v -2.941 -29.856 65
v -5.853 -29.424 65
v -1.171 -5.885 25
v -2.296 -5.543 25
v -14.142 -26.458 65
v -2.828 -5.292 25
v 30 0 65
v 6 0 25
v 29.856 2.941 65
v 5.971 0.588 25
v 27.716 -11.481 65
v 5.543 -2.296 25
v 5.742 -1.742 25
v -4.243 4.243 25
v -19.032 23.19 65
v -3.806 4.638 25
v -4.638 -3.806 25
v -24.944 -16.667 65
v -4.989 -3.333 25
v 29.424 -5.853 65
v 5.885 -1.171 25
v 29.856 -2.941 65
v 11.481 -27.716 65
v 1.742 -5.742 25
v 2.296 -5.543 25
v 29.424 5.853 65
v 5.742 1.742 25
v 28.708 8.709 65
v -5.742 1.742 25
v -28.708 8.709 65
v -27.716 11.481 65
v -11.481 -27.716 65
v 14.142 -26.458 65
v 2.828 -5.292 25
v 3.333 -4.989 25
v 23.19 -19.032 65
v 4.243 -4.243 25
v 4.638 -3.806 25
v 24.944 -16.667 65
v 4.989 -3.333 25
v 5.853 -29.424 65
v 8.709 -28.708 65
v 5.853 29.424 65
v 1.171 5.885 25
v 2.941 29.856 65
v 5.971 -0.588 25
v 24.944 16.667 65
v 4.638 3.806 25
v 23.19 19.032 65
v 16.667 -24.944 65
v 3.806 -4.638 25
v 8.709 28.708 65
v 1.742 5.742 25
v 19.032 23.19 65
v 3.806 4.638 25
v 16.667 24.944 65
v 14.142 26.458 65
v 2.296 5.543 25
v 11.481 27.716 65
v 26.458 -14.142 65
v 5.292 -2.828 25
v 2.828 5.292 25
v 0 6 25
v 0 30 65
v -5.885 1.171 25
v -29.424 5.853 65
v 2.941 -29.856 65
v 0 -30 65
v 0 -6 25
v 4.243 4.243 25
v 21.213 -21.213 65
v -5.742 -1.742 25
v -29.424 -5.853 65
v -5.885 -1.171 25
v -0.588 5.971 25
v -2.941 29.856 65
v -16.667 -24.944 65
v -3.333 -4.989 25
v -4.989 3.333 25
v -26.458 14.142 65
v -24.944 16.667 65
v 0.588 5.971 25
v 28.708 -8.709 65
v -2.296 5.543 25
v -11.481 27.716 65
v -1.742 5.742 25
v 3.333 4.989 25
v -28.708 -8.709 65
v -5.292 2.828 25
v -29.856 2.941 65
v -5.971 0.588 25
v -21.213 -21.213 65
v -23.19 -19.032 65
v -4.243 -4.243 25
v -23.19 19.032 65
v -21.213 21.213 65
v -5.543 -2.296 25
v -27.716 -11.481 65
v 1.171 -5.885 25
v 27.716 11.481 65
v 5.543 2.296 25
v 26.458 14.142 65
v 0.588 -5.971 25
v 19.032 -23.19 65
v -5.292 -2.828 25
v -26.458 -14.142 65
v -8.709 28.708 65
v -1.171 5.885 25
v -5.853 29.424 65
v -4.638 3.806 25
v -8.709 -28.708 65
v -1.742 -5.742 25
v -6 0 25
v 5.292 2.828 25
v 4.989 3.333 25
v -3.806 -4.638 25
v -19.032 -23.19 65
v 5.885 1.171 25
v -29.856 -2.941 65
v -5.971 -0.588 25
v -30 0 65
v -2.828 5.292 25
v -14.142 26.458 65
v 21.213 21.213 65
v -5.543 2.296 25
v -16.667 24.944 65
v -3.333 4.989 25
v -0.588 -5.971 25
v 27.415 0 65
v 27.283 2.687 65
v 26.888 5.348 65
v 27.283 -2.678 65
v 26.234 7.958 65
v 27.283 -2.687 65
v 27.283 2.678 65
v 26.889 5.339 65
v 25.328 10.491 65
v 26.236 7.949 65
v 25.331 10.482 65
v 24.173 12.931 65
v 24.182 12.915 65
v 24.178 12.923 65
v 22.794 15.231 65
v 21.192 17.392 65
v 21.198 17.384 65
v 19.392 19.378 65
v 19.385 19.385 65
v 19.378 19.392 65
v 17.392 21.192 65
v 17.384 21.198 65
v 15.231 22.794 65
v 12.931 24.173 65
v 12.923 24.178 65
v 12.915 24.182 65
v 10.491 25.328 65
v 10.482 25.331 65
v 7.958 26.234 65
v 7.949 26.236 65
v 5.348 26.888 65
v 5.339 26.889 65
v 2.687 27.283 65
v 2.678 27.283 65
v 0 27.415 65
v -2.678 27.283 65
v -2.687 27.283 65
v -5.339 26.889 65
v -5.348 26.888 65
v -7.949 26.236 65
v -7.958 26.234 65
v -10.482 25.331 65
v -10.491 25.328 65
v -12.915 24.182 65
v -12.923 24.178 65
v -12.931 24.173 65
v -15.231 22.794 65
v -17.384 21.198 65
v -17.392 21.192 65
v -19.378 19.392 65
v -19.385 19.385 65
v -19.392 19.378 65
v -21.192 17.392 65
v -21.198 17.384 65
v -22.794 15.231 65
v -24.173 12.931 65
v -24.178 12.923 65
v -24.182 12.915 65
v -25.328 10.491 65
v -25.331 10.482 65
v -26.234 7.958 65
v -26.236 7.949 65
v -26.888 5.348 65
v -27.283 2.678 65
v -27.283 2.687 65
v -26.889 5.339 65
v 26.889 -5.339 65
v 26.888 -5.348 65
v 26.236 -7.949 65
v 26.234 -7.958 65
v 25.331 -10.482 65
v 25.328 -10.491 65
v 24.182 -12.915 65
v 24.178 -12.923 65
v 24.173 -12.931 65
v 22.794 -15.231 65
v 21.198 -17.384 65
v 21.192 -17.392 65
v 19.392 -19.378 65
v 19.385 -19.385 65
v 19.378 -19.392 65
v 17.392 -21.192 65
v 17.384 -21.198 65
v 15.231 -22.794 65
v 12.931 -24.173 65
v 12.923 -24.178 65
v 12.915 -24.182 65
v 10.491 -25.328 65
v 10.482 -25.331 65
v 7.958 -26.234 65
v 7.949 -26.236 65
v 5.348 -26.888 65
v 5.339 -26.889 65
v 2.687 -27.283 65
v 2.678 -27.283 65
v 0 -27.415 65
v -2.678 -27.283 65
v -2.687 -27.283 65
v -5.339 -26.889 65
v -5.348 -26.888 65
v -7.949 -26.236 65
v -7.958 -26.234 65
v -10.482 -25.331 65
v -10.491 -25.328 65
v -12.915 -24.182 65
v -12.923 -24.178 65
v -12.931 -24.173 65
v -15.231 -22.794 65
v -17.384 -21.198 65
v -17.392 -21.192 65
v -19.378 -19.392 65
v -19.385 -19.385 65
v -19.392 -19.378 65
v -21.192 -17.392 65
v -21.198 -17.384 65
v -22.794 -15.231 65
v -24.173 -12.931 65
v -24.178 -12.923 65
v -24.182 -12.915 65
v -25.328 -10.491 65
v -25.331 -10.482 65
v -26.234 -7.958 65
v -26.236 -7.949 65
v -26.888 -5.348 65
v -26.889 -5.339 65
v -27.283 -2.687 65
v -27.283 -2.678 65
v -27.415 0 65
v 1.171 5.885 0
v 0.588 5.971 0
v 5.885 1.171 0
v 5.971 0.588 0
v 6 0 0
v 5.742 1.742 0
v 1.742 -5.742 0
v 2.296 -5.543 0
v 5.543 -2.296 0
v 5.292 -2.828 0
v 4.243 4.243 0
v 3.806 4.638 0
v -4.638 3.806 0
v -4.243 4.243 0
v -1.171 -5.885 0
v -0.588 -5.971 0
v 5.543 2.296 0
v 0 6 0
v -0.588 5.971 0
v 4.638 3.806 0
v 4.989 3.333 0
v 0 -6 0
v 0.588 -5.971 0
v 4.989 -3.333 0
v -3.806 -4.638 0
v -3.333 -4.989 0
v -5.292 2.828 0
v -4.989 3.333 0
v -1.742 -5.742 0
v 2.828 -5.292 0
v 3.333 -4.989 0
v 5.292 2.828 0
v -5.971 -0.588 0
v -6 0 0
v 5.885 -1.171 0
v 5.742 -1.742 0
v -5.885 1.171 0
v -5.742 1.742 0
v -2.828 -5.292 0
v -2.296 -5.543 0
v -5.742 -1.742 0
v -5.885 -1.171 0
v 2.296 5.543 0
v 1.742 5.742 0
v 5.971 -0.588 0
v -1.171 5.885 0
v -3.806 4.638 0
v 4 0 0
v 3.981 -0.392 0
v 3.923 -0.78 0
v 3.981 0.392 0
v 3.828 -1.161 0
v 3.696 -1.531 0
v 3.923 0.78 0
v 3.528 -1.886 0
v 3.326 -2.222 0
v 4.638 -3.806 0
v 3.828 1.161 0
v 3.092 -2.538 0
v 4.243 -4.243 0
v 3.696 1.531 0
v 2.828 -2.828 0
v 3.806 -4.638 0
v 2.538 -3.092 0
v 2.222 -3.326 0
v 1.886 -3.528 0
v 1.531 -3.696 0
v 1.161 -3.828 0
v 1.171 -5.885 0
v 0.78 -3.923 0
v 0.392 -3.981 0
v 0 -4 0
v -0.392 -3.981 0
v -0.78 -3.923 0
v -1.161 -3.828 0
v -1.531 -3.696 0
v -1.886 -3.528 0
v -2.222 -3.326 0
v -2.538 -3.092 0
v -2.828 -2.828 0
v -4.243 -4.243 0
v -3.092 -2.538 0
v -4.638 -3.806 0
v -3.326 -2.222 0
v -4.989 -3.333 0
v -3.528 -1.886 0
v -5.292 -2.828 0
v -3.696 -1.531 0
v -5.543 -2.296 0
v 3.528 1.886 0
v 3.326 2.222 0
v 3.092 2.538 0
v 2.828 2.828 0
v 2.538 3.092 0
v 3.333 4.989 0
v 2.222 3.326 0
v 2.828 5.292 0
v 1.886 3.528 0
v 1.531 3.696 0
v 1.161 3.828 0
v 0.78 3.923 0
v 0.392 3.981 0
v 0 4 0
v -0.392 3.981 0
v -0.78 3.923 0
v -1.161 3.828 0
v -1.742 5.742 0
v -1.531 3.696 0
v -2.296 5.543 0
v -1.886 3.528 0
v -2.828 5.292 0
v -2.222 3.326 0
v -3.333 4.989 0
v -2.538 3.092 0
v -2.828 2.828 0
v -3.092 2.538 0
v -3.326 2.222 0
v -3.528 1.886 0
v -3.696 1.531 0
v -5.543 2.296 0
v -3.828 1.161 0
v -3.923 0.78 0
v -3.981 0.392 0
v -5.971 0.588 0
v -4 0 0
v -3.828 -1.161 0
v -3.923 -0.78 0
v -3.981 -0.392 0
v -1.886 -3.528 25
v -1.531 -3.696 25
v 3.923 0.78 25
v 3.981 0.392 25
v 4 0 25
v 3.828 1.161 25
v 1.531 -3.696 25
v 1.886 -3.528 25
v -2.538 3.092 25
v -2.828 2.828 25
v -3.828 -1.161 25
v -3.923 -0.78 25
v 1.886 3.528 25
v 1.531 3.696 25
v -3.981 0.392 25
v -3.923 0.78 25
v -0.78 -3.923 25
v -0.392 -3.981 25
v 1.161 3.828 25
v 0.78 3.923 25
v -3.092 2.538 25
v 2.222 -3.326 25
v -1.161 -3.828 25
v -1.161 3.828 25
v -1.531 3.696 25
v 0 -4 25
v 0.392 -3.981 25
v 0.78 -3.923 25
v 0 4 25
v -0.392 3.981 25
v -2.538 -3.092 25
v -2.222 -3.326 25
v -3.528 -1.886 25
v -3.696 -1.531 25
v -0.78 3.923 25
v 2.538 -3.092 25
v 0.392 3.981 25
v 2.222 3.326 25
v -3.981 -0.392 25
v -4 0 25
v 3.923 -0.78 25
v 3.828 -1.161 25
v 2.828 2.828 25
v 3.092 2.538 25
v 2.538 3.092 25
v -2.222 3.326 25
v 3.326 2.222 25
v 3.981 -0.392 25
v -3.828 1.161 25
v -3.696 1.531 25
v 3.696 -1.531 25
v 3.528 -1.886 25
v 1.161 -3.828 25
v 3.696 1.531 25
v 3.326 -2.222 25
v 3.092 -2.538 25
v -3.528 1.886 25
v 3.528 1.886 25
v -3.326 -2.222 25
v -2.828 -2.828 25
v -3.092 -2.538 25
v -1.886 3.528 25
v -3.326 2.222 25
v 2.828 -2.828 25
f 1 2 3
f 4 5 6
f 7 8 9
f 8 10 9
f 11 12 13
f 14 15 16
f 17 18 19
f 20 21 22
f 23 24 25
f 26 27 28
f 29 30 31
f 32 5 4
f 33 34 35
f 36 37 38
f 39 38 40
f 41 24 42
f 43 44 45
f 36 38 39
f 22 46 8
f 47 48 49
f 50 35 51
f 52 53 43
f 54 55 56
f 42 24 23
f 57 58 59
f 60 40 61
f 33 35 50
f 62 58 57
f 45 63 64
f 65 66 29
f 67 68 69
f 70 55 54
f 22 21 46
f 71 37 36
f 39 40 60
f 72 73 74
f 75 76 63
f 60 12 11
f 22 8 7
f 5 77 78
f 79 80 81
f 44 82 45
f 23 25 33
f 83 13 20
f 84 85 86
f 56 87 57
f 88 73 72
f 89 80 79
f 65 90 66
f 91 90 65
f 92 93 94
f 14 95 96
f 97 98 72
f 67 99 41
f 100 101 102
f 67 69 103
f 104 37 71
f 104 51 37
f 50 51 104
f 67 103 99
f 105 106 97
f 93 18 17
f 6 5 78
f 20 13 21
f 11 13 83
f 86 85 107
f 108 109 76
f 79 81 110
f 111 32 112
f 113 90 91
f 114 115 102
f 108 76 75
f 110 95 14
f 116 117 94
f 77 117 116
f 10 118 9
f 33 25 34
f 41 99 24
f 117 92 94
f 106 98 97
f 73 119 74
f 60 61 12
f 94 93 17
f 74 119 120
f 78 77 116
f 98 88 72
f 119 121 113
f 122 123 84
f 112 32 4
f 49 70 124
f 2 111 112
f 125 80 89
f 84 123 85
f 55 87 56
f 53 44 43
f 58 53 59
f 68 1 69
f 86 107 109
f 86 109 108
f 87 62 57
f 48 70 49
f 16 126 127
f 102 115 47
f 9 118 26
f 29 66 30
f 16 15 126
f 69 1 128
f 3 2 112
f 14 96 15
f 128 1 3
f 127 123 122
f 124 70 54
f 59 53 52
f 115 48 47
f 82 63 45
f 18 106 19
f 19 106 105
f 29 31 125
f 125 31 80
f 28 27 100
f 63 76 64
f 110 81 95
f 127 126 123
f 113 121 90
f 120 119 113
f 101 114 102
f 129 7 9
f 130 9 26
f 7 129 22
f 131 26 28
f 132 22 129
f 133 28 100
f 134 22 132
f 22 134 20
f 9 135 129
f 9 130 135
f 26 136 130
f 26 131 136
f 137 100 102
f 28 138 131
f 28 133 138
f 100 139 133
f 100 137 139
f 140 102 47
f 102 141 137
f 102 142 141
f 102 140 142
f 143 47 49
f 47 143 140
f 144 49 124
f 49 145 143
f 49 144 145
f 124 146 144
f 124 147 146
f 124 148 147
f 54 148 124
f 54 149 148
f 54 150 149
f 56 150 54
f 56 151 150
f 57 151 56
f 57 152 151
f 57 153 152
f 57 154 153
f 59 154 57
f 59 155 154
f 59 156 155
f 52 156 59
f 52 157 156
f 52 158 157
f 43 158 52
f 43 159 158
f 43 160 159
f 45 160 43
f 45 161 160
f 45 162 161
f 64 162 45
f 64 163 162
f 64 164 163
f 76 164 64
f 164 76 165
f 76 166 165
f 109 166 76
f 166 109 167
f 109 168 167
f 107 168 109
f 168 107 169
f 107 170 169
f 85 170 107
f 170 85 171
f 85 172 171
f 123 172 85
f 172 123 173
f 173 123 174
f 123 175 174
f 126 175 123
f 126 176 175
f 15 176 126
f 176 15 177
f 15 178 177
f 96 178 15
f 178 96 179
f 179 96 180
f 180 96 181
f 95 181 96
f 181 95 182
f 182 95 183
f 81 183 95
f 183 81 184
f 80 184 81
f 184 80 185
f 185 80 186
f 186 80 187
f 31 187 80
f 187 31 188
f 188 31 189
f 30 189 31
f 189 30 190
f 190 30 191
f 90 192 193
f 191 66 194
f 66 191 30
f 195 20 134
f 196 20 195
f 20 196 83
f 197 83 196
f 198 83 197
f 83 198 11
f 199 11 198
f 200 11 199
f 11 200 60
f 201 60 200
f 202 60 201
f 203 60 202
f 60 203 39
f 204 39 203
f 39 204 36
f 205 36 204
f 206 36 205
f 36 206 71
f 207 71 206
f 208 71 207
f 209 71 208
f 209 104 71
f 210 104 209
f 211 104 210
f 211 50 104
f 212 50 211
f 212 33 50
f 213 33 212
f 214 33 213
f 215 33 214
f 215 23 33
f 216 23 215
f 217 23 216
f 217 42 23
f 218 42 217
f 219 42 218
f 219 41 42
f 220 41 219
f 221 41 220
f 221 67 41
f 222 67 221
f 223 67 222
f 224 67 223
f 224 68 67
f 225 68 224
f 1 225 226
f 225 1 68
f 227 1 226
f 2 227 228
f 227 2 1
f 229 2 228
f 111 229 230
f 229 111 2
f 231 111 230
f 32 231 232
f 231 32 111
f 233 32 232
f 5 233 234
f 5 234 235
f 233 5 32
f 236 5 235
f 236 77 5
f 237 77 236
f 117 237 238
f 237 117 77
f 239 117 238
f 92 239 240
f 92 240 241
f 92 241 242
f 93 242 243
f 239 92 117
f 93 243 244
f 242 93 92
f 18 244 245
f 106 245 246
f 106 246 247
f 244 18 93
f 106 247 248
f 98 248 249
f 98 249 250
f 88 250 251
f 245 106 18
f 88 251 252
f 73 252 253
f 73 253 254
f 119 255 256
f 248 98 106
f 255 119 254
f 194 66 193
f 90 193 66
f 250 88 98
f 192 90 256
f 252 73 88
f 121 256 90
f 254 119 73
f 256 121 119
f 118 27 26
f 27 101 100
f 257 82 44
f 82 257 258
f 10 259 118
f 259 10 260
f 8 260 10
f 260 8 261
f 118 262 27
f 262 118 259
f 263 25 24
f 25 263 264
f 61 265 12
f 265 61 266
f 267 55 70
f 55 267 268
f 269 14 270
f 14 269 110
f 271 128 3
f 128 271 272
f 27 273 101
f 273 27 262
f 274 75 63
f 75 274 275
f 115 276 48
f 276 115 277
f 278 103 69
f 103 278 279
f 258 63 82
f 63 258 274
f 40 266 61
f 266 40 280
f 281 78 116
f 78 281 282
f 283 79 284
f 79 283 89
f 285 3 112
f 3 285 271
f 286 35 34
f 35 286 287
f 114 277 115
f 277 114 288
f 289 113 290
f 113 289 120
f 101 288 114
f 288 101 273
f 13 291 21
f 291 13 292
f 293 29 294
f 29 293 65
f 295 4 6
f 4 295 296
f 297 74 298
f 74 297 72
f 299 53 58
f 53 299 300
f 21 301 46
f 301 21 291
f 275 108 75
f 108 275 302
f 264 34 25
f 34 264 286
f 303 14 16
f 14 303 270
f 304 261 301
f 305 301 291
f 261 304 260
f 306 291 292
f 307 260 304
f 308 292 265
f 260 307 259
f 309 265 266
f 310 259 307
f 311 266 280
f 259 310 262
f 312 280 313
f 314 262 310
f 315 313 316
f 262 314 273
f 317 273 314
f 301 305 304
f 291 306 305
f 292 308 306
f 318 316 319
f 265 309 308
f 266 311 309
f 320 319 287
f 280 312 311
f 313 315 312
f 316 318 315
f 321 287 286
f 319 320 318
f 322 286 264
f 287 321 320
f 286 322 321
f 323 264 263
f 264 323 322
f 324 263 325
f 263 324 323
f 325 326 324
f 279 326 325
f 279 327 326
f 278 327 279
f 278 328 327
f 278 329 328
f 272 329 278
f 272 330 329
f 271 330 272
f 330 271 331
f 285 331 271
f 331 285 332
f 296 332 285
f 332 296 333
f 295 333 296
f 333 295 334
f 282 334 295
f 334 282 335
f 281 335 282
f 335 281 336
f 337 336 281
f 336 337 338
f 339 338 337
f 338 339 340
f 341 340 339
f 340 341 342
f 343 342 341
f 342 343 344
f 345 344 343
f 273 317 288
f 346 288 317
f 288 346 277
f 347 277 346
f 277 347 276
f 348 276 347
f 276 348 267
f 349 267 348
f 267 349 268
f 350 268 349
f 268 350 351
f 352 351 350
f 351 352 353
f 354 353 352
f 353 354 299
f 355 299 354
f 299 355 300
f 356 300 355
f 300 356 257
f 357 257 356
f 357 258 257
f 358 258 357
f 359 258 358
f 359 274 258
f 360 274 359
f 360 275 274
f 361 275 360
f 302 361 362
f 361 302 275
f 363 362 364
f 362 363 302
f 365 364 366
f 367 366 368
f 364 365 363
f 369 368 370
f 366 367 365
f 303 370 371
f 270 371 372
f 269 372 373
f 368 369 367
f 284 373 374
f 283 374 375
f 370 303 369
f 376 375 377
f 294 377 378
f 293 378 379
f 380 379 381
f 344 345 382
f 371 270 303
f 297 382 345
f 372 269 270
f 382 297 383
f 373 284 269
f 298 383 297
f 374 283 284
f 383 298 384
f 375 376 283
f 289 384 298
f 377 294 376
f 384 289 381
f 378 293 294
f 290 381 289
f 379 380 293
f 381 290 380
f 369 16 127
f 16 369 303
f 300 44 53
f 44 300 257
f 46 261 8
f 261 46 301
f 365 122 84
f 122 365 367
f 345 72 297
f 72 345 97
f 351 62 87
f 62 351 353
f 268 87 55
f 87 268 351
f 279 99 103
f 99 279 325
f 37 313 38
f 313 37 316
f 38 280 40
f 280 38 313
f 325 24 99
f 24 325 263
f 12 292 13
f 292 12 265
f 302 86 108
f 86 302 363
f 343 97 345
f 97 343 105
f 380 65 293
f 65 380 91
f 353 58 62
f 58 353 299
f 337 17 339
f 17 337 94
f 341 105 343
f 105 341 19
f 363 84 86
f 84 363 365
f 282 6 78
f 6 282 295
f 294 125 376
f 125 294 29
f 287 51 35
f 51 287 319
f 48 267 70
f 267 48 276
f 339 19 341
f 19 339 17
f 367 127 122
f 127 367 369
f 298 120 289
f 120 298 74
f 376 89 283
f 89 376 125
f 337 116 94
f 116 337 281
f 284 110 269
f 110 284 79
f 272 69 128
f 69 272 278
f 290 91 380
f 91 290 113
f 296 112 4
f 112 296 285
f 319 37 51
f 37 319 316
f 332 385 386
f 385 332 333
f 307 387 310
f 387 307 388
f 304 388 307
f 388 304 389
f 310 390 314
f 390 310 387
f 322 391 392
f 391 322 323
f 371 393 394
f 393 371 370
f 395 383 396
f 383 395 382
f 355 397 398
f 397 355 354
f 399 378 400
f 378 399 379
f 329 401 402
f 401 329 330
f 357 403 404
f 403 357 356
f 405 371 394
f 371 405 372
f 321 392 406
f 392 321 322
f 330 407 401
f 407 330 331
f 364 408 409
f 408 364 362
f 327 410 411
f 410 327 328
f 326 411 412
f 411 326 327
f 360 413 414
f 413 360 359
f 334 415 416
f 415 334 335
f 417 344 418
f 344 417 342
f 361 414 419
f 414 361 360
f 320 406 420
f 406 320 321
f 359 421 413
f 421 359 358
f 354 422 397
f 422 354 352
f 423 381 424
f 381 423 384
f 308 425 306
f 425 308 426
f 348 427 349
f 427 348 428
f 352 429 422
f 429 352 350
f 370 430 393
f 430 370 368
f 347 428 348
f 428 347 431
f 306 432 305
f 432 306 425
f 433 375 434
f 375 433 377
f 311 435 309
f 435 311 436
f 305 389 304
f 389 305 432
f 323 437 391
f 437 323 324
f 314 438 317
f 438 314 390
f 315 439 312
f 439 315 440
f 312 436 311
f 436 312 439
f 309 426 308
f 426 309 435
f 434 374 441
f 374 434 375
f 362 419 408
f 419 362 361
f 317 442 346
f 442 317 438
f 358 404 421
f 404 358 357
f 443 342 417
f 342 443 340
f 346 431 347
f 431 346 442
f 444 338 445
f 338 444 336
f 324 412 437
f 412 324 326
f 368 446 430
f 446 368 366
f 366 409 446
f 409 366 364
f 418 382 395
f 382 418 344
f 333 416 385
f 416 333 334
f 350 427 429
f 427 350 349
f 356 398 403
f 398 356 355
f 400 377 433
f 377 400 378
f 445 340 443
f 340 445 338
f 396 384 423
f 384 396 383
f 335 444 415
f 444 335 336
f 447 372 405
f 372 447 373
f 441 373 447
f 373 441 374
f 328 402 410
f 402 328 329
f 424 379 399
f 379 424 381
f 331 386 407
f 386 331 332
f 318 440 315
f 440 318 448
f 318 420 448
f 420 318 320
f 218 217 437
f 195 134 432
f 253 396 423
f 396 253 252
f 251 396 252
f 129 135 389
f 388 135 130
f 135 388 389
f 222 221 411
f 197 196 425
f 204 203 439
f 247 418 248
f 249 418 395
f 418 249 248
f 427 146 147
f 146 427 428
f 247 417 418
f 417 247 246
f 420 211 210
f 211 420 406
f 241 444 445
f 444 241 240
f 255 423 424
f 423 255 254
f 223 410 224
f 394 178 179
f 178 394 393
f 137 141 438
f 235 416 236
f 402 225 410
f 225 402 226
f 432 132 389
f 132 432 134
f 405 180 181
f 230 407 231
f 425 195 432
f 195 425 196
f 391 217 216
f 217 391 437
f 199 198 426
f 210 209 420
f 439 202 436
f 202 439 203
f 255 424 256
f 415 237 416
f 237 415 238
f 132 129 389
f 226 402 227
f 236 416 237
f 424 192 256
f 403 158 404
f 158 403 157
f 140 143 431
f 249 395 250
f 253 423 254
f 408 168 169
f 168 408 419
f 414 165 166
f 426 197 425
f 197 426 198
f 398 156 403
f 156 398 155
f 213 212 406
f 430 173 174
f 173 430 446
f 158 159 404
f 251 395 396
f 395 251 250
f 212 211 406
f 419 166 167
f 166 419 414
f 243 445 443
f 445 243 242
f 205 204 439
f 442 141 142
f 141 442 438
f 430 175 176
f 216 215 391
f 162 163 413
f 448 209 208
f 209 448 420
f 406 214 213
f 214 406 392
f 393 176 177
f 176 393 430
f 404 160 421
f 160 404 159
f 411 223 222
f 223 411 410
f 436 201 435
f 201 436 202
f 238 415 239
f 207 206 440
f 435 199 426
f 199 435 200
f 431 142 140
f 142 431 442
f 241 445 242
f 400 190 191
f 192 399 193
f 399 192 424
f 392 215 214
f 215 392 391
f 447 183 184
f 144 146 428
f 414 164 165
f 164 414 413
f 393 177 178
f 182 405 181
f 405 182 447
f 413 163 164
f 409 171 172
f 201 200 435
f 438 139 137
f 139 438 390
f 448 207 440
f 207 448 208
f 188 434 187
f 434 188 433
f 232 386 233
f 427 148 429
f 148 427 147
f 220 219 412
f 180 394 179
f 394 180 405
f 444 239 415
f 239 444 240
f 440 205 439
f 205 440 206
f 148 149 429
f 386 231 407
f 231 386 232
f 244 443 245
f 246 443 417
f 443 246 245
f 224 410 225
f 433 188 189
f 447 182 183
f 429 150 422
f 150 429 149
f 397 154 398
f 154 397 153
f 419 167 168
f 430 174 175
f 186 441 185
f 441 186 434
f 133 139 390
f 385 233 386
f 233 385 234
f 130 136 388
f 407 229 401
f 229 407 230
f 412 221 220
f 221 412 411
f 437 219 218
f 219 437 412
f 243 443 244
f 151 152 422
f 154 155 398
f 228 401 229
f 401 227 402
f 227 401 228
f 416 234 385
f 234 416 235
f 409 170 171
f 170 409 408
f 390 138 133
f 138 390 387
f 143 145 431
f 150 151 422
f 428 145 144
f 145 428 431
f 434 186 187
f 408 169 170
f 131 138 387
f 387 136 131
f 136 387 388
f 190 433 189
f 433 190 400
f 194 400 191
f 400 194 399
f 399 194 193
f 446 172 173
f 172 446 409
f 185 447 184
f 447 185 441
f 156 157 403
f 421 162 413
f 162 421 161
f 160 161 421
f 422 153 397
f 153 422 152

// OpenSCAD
// Funnel - a conical mouth narrowing into a straight spout, hollow with a constant wall. NOVEL
// general part (a generic funnel, not any one labware item).
//
// @desc hollow funnel: conical mouth into a straight spout
// @prompt Design a funnel in OpenSCAD: a cone {top} mm across the mouth narrowing over {cone_h} mm to a spout {spout_d} mm across and {spout_l} mm long, with a {wall} mm wall throughout. Reply with a single complete OpenSCAD file.
// @param top     mouth diameter, mm   [30:90]
// @param spout_d spout diameter, mm   [6:20]
// @param cone_h  cone height, mm      [20:60]
// @param spout_l spout length, mm     [10:40]
// @param wall    wall thickness, mm   [1.2:3]

top     = 60;
spout_d = 12;
cone_h  = 40;
spout_l = 25;
wall    = 2;

$fn = 64;

ib = max(1.6, spout_d - 2 * wall);   // keep the spout bore open even if the wall is thick

translate([0, 0, spout_l])          // rest the spout tip on the bed (z = 0)
difference() {
    union() {
        cylinder(h = cone_h, d1 = spout_d, d2 = top);                 // cone: spout end up to mouth
        translate([0, 0, -spout_l]) cylinder(h = spout_l + 0.01, d = spout_d);   // spout below
    }
    translate([0, 0, -spout_l - 1])
        cylinder(h = spout_l + 1 + 0.01, d = ib);                     // bore through the spout
    cylinder(h = cone_h + 1, d1 = ib, d2 = top - 2 * wall);           // inner cone, open mouth
}
